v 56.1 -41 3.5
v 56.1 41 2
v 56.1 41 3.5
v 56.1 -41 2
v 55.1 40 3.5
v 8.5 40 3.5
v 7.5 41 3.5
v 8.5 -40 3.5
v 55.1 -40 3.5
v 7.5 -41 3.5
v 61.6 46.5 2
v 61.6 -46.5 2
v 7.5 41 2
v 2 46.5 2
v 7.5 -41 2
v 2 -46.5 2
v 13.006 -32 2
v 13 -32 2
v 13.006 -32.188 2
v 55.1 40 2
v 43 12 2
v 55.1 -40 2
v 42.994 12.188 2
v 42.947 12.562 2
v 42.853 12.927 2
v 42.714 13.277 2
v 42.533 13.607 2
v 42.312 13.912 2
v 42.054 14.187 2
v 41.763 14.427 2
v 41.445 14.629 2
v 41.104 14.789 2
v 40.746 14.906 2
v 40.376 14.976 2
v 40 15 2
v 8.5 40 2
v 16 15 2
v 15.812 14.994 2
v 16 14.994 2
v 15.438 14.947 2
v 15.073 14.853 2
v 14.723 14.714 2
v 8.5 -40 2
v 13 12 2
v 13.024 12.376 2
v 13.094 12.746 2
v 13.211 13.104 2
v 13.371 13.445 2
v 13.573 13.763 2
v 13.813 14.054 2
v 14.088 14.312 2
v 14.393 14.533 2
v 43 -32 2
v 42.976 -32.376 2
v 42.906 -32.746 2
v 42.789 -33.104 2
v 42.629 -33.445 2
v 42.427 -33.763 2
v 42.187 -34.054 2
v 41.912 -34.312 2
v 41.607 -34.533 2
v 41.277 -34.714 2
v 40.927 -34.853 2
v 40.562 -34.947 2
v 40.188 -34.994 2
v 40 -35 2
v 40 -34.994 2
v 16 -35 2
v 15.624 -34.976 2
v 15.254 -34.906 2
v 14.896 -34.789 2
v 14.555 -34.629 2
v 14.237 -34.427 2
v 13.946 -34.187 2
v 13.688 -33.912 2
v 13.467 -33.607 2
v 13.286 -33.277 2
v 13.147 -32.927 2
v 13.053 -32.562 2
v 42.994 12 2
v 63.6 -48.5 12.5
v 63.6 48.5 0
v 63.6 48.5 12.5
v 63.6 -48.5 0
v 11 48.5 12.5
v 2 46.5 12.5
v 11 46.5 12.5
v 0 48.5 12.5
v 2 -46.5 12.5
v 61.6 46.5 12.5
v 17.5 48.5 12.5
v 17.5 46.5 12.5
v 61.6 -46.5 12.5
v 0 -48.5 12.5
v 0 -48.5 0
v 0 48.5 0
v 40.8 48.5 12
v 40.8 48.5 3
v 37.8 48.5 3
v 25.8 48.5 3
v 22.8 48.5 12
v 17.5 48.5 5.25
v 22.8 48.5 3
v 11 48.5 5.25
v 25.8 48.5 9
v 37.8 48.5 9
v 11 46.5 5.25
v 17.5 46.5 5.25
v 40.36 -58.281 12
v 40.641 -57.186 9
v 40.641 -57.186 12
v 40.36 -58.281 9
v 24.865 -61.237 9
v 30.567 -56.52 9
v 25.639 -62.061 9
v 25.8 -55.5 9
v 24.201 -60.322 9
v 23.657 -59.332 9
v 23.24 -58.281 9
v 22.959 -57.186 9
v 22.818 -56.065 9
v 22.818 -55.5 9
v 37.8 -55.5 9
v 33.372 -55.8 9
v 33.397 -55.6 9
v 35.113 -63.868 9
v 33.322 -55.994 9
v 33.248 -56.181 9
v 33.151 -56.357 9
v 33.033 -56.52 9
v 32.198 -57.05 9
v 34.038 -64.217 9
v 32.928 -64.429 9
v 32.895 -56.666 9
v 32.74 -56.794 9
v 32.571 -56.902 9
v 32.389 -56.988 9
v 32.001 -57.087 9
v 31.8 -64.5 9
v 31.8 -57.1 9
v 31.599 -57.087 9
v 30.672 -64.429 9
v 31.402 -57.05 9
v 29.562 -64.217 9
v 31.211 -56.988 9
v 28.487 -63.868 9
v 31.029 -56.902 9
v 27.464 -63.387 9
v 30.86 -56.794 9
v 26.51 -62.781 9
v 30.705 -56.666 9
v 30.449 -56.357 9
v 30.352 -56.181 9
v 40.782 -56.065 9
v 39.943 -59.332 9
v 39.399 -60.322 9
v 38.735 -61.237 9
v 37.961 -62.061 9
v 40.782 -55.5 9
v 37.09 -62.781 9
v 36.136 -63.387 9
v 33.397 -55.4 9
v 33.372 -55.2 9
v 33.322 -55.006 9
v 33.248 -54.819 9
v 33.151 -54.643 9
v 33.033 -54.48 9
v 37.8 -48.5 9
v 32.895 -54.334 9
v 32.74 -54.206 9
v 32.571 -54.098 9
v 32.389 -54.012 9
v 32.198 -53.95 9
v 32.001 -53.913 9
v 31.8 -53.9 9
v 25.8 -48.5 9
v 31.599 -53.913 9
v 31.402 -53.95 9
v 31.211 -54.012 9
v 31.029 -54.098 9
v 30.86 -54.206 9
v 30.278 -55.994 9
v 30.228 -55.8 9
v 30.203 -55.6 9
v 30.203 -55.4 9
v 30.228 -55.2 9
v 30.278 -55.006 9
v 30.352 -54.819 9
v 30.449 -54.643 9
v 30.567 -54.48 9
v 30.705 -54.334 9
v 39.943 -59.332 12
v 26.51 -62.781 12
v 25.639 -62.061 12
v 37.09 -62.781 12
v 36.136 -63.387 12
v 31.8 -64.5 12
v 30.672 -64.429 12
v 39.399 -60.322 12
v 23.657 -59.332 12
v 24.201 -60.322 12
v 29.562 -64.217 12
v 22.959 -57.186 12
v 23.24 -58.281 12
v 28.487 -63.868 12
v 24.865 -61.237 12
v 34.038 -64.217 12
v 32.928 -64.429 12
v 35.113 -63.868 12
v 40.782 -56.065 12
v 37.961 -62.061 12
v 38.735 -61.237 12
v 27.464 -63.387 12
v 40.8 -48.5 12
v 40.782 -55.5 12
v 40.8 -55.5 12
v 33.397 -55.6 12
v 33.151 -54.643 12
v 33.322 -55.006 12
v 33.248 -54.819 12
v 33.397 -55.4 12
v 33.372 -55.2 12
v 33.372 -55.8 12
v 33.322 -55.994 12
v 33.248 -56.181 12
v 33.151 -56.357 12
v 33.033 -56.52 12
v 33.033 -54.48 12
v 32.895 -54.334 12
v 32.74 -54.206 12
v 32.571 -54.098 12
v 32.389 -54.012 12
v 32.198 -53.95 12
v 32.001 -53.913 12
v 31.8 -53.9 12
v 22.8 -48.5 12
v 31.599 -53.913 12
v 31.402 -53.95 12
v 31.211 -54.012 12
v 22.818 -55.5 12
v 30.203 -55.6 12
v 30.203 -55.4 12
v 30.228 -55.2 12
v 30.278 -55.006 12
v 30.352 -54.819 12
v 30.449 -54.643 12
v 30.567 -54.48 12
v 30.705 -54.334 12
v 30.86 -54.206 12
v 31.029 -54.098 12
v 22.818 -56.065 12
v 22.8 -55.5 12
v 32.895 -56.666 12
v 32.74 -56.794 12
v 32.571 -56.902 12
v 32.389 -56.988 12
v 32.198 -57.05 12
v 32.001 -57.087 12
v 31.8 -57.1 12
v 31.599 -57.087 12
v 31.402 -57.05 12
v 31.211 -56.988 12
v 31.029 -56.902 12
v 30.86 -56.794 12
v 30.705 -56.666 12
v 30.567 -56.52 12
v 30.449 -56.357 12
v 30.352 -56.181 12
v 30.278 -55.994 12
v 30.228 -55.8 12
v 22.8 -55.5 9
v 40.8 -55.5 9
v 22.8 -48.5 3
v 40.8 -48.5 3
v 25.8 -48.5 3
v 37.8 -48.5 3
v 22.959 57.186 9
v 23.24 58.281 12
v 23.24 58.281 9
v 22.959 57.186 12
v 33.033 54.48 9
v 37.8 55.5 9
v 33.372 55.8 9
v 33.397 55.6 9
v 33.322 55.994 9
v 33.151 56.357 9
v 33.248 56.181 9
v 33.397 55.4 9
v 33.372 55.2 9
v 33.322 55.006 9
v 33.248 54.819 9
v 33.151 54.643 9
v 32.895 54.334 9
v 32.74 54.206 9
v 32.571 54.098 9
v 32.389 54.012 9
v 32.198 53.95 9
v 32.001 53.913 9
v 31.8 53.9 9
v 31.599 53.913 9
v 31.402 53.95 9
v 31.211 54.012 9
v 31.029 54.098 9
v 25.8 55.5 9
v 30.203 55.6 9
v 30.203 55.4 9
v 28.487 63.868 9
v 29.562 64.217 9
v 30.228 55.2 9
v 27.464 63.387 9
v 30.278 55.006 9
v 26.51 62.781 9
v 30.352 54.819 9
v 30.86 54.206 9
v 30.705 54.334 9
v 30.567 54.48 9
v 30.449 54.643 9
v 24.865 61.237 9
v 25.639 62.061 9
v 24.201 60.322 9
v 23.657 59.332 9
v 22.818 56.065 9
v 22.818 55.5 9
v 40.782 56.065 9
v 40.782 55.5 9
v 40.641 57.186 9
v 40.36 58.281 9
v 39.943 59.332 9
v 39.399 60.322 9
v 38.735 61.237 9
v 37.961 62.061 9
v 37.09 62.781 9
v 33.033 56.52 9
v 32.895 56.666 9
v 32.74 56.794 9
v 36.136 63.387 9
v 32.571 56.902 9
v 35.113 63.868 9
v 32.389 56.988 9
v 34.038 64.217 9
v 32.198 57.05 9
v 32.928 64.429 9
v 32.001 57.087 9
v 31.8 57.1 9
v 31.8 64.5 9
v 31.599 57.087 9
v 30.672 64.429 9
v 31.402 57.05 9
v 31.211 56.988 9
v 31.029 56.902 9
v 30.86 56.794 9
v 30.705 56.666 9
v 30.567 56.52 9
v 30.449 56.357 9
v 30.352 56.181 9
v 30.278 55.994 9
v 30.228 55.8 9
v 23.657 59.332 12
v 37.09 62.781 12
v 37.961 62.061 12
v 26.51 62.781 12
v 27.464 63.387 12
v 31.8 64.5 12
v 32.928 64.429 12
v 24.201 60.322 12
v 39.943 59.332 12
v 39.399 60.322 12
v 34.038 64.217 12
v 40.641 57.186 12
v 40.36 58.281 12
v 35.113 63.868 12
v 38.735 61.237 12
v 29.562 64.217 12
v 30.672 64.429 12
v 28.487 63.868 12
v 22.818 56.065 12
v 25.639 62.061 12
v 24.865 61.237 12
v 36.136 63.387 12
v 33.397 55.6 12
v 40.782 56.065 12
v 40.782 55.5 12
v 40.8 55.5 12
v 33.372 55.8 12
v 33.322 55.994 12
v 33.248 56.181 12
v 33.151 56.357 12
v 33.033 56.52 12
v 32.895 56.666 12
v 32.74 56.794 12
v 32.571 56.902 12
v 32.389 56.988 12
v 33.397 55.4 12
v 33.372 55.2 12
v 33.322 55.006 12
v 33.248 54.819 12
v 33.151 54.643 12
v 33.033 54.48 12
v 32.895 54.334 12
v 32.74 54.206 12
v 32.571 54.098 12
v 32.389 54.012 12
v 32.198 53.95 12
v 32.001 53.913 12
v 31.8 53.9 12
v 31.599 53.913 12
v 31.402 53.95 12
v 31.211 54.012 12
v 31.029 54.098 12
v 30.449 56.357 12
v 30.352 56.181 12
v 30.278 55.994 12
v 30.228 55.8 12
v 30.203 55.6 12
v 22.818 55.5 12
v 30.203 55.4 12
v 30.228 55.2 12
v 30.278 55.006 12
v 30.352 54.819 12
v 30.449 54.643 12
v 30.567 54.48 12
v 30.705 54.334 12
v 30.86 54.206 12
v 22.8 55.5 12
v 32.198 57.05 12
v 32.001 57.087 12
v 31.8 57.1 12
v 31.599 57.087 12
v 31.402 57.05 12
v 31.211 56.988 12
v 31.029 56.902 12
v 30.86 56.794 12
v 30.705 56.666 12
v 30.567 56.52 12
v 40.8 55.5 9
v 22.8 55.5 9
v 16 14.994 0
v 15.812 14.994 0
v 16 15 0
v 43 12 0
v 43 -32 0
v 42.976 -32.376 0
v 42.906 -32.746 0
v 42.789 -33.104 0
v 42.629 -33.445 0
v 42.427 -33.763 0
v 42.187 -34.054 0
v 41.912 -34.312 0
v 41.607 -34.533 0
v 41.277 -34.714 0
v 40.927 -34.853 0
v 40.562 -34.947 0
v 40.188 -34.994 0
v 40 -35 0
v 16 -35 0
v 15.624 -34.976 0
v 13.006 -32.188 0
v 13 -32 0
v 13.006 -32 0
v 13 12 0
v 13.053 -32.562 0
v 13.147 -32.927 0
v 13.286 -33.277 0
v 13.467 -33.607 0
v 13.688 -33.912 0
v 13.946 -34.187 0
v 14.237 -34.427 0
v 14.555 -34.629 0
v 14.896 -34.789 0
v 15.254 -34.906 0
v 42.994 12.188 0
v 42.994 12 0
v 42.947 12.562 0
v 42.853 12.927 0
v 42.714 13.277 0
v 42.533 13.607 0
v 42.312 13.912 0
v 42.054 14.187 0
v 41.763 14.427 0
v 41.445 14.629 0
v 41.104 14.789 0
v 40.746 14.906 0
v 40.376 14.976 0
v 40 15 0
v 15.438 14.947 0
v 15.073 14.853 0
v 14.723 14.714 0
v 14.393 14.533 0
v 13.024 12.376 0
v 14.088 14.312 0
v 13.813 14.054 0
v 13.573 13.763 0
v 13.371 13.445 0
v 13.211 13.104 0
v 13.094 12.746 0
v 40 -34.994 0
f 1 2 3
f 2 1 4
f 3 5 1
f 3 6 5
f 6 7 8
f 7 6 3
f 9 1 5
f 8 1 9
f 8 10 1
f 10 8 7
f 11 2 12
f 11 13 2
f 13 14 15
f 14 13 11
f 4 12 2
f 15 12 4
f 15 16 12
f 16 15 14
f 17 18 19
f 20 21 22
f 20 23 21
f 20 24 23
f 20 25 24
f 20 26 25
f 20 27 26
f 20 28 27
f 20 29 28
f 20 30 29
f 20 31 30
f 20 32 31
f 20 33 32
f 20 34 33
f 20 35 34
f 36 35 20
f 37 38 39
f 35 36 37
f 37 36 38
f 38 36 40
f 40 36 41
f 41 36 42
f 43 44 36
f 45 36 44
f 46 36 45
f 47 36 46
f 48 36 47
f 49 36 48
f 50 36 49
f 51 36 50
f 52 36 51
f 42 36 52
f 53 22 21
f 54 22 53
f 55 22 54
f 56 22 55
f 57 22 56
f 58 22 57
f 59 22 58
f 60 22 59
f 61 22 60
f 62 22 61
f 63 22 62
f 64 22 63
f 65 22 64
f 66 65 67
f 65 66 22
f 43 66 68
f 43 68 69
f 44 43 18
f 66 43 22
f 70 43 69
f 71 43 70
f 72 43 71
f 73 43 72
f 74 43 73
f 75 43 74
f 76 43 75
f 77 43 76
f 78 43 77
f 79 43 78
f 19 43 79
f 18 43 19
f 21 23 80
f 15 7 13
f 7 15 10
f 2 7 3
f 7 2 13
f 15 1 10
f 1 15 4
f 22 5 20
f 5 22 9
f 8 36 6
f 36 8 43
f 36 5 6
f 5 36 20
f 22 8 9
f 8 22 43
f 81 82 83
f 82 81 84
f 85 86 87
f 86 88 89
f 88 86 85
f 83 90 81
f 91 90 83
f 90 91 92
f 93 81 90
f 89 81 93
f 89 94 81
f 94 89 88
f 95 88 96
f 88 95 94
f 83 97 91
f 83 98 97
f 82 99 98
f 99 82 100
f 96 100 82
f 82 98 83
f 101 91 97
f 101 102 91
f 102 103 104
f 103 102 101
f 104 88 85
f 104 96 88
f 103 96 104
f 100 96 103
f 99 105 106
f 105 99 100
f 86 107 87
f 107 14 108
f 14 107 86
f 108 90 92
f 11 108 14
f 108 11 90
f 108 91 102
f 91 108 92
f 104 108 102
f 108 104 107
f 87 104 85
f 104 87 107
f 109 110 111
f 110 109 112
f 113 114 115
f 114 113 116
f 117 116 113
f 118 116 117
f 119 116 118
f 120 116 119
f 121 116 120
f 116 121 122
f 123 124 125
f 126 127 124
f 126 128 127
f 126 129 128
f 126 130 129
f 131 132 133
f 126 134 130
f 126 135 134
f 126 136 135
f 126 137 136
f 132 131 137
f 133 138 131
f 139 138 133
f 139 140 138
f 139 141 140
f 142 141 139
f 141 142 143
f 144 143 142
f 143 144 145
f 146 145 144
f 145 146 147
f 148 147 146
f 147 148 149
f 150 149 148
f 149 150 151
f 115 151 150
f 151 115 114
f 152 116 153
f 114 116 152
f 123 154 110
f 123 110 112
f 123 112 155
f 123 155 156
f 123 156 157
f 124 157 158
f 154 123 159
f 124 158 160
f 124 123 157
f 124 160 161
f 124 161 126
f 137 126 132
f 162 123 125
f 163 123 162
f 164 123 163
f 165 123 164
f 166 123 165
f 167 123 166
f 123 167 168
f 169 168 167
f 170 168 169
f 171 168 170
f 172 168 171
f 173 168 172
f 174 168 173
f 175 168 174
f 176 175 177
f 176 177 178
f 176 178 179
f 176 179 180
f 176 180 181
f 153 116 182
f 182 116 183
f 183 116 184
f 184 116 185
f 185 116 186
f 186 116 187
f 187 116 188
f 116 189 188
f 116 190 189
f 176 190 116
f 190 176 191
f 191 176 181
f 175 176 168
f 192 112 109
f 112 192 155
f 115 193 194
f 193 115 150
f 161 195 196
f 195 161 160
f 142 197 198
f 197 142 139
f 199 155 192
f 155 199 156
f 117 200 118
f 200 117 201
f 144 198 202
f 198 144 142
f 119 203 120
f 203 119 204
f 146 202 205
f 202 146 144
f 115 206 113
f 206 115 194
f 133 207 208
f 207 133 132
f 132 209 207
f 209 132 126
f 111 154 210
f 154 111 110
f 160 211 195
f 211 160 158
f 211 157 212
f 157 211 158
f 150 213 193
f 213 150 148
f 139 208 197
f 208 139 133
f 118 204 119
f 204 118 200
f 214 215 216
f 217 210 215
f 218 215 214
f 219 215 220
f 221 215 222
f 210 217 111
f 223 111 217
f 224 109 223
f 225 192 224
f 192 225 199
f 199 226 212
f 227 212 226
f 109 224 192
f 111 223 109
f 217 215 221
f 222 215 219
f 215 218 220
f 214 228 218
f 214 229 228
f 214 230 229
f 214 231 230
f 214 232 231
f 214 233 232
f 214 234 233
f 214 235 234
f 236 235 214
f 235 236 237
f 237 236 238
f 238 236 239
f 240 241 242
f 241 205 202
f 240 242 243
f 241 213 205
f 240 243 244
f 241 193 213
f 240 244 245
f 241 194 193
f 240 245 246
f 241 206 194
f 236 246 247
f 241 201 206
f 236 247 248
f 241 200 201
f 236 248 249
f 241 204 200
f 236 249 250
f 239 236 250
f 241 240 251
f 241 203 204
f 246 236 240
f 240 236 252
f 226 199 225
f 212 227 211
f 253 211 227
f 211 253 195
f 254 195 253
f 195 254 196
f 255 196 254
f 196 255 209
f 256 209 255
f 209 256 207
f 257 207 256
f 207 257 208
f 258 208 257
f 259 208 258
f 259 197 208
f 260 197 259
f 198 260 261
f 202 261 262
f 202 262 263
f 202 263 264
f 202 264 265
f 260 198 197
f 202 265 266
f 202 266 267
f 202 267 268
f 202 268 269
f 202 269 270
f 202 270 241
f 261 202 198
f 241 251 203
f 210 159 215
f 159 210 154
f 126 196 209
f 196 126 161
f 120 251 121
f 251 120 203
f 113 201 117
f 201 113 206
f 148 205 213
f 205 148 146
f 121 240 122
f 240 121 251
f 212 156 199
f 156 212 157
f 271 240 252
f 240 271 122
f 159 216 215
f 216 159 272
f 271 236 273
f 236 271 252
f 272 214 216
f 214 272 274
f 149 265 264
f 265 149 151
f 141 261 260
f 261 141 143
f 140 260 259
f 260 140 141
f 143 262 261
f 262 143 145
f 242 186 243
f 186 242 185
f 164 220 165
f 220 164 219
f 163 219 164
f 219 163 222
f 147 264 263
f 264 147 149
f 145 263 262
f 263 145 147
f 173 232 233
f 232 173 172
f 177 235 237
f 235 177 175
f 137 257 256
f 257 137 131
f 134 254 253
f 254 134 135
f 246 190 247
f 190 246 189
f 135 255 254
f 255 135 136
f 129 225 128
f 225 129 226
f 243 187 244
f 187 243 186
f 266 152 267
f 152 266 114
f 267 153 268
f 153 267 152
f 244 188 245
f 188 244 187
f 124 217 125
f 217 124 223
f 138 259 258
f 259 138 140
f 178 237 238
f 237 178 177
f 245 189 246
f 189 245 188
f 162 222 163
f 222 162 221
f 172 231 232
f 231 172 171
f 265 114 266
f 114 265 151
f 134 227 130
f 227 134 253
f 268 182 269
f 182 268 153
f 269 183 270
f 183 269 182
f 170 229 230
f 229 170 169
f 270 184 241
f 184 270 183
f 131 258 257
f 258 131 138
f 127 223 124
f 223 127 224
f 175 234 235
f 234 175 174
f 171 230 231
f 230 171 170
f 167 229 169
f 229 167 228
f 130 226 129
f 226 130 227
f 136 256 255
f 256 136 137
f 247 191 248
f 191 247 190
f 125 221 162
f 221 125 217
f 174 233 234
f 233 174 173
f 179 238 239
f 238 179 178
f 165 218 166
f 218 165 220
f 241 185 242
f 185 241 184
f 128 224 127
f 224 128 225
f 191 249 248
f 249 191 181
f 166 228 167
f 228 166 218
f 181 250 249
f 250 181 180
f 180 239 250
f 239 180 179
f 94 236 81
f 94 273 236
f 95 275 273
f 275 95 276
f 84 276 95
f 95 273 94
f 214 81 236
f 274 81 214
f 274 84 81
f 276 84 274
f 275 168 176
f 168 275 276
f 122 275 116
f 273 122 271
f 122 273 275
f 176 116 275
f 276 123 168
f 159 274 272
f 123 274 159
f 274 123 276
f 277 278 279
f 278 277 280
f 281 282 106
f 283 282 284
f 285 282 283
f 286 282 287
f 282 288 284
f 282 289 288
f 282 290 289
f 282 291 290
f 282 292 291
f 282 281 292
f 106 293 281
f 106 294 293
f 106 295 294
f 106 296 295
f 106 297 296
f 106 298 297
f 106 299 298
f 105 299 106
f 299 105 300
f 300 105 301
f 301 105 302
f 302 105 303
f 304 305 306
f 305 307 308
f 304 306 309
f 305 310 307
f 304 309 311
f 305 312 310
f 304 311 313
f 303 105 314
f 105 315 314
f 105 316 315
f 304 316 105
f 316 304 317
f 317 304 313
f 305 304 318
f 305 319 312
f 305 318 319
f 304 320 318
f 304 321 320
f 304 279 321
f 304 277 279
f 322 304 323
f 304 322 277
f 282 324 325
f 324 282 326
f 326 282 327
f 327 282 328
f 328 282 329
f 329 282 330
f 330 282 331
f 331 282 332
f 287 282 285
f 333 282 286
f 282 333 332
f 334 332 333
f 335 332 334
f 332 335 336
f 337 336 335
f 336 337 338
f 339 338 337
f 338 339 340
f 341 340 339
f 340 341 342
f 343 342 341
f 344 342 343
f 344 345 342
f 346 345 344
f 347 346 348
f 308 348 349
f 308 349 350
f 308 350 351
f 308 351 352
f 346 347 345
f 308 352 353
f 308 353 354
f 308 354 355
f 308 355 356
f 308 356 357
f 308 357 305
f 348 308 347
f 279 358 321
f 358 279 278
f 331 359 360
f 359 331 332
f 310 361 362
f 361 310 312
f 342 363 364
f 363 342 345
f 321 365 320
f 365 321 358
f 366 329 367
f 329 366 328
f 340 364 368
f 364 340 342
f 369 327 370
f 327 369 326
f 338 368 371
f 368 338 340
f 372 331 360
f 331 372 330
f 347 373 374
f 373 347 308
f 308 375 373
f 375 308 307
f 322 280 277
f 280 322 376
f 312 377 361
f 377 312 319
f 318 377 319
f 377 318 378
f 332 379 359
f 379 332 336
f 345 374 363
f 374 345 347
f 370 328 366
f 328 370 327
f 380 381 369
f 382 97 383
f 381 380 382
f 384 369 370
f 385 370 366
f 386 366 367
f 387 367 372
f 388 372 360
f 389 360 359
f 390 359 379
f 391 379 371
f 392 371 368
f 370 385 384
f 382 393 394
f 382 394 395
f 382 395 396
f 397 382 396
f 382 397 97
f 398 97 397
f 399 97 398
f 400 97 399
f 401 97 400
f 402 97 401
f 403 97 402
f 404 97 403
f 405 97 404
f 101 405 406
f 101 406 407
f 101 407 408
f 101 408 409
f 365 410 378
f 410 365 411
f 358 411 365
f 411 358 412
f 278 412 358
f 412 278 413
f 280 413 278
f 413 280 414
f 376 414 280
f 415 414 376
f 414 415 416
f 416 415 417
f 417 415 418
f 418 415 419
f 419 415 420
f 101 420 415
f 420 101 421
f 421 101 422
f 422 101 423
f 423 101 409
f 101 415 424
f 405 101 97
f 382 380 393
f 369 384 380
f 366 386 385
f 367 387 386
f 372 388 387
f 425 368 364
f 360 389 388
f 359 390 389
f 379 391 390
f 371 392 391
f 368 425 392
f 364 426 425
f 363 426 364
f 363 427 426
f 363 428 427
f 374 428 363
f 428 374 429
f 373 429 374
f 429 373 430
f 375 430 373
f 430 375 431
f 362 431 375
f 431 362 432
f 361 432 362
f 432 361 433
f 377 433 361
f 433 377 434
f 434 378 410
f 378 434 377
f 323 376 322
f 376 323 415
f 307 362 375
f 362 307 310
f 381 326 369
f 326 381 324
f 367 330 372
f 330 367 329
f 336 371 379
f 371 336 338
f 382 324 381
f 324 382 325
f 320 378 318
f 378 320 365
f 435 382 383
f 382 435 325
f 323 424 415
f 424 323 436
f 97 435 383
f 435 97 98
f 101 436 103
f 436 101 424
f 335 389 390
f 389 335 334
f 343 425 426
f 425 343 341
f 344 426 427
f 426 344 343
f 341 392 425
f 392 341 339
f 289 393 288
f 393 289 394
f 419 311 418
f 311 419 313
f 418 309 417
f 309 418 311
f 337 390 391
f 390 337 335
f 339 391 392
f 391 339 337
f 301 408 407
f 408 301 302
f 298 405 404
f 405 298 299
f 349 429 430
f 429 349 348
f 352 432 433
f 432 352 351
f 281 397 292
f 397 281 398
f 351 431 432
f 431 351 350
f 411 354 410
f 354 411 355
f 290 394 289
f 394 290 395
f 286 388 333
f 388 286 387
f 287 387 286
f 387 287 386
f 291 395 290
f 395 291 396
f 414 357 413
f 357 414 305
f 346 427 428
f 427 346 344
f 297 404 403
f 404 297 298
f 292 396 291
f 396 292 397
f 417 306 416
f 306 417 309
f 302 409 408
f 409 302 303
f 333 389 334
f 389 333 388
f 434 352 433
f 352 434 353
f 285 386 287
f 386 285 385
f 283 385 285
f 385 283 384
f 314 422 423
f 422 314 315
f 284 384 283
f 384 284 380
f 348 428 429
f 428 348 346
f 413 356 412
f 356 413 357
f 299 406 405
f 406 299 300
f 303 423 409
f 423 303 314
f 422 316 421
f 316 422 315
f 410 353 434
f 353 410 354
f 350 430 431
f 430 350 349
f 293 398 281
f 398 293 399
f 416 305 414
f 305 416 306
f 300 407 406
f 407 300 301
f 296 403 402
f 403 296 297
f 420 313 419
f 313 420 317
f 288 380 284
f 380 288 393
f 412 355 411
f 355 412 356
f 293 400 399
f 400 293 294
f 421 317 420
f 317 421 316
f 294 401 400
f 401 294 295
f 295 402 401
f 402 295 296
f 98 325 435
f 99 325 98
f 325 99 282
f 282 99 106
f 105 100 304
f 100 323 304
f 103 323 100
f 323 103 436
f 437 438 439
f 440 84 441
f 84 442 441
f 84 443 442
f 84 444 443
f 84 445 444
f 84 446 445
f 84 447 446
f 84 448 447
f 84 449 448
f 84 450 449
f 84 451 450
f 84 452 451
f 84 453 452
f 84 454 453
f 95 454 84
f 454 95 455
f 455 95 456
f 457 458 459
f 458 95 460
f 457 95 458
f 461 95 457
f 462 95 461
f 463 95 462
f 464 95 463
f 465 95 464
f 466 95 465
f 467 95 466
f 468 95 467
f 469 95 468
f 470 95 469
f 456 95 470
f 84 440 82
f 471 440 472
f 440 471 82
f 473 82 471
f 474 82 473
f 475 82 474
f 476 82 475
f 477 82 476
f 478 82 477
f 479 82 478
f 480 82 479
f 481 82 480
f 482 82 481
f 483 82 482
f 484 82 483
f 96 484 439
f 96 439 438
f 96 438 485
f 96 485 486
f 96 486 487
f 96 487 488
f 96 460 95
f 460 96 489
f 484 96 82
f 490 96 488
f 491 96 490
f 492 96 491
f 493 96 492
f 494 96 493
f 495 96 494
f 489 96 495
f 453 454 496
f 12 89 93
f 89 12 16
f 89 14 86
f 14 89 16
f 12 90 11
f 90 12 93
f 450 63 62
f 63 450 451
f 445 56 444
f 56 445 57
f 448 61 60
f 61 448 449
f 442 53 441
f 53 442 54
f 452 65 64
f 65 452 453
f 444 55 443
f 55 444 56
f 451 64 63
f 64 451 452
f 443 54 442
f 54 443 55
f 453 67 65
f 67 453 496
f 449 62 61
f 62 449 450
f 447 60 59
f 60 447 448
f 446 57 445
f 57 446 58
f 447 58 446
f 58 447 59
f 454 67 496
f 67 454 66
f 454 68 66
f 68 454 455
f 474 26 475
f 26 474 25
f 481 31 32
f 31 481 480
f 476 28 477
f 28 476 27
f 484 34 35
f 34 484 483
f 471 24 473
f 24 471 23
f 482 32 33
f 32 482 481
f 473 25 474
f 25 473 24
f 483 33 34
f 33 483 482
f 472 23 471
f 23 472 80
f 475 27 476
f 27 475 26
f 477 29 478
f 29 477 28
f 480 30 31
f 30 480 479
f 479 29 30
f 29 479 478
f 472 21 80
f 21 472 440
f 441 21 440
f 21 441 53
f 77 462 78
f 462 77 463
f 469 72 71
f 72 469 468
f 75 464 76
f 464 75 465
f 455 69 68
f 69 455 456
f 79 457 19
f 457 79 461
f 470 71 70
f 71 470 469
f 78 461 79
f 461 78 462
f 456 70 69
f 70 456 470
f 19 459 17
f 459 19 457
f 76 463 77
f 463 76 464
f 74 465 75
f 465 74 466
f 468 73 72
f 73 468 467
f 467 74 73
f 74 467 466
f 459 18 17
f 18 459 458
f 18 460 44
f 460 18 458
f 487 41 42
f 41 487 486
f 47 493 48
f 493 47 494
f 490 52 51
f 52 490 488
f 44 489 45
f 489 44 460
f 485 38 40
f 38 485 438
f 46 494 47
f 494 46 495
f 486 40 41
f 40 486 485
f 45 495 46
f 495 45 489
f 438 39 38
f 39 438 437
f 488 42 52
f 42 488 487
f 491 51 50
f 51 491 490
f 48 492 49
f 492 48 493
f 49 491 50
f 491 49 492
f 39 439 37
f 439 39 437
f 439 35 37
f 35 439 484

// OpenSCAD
/* File: codewheel_cover.scad
 * Cover for PC board box in codewheel_fixture
 * Author: deh
 * Latest edit: 201702031630
 */

 $fn=50;

// PC board dimensions
pc_slop = 4;
pcwid = 49.6 + pc_slop;	// Width of PC board
pclen = 83.0 + pc_slop;	// Length of PC board
pcthick = 1.7;	// Thickness of board

module wedge(l, w, h)
 {
   polyhedron(
      points=[[0,0,0], [l,0,0], [l,w,0], [0,w,0], [0,w,h], [l,w,h]],
       faces=[[0,1,2,3],[5,4,3,2],[0,4,5,1],[0,3,4],[5,2,1]] );
 }

module tube(d1,d2,ht)
{
   difference()
   {
     cylinder(d = d1, h = ht, center = false);
     cylinder(d = d2, h = ht + .001, center = false);
   }
}
module mag_mnt_bar(d1, d2, len, ht)
{
   difference()
   {
     union()
     {
        cylinder(d = d1, h = ht, center = false);
        translate([-len, -d1/2, 0])
           cube([len, d1, ht]);
     }
       cylinder(d = d2, h = ht + .001, center = false);
   }
    
}
// Tabs for holding pc board cover down
bt_wid = 18;
bt_hole_dia = 3.2;  // Screw hold dia
bt_thick = 3;	// Thickness
bt_len = 10;	// Length
bt_w_ht = 6;	// Stiffner height

module brd_tab()
{
   mag_mnt_bar(bt_wid, bt_hole_dia, bt_len - shell_wall, bt_thick);
   translate([0 ,(bt_wid/2 - bt_thick),bt_thick])
      rotate([0,0,90])
         wedge(bt_thick,bt_len-3,bt_w_ht);
   translate([0 ,-(bt_wid/2),bt_thick])
      rotate([0,0,90])
         wedge(bt_thick,bt_len-3,bt_w_ht);
}
base_thick 	= 2.0;	// Thickness of base
base_rad	= 10;	// Radius around mags

shell_wall = 2;		// Cover wall thickness
shell_ht = 10.5;	;	// Cover side height
shell_gap = 1;		// Cover gap between enclosure walls and cover

shell_x = pcwid + 4*shell_wall + 2*shell_gap;
shell_y = pclen + 4*shell_wall + 2*shell_gap;

tab_ofs = shell_wall + shell_gap;

shell_iofs = 5;
shell_ix = pcwid-shell_iofs;  // Inner ridge location
shell_iy = pclen-shell_iofs;
shell_ih = 1.5;	// Height of inner ridge
shell_iw = 1; 	// Width of inner ridge
shell_iix = shell_ix - 2*shell_iw;
shell_iiy = shell_iy - 2*shell_iw;
shell_or_x1 = shell_gap + 2*shell_wall + shell_iofs/2;
shell_or_x2 = shell_or_x1 + shell_iw;

// CAN bus cable cutout in wall
cc_wid = 6.5;		// Telephone type cable width
cc_thick = 2.25;	// Thickness
cc_frm_top = 3;		// Offset from top of side
cc_frm_side = 11;	// Offset from side
cc_sense_dia = 4;	// Sensor cable dia
cc_z = cc_thick + cc_frm_top;

module pc_shell()
{

   // Cover top
   translate([0,-shell_y/2,0])
   cube([shell_x,shell_y,base_thick],false);

   // Ridge for O-ring type sealing
   difference()
   {
      translate([shell_or_x1,-shell_iy/2,base_thick])
         cube([shell_ix,shell_iy,shell_ih],false);
      translate([shell_or_x2,-shell_iiy/2,base_thick])
         cube([shell_iix,shell_iiy,shell_ih],false);

   }

   // Wall: +y end with cable cutout
 difference()
 {
   translate([0, shell_y/2 - shell_wall,base_thick])
     cube([shell_x, shell_wall, shell_ht]);
   translate([cc_frm_side, shell_y/2 - shell_wall - .01, shell_ht - cc_z])
     cube([cc_wid,shell_wall + .01, 10],false);
 }
   // Wall: -y end 
   translate([0, -shell_y/2,base_thick])
     cube([shell_x, shell_wall, shell_ht]);
//    rotate([0,0,-90])
//     rounded_rect_ridge(shell_wall, shell_x, shell_ht);

   // Wall: x=0 side
   translate([0, -shell_y/2, base_thick])
   {
     cube([shell_wall, shell_y, shell_ht]);
//       round_ridge(shell_wall,shell_y, shell_ht);
   }

   // Wall: +x side
   translate([shell_x - shell_wall, -shell_y/2, base_thick])
     cube([shell_wall, shell_y, shell_ht]);

 
   // Tabs for mounting top cover
   translate([shell_x/2,-(shell_y/2 + bt_len - tab_ofs),shell_ht+1.5])
     rotate([0,180,90])
        brd_tab();
   translate([shell_x/2,(shell_y/2 + bt_len - tab_ofs),shell_ht+1.5])
     rotate([0,180,-90])
        brd_tab();

}
module rounded_bar_end(l, w, h)
{
        cylinder(d = w, h = h, center = false);
        translate([-l, -w/2, 0])
           cube([l, w, h],false);
}
module rounded_rectangle(lo,wo,h,rad)
{
 translate([-rad/2,rad/2,0])
 {
  l = lo - rad; w = wo - rad;
  lr = l - 2*rad; wr = w - 2*rad;
   translate([-l,0,0])
     cube([l,w,h],false);

   ww = w; ll = l;
   translate([0,0,0])
     rounded_bar_end(ll,rad,h);
   translate([0,ww,0])
     rotate([0,0,90])
        rounded_bar_end(ww,rad,h);
   translate([-ll,0,0])
     rotate([0,0,-90])
        rounded_bar_end(ww,rad,h);
   translate([-ll,ww,0])
     rotate([0,0,180])
        rounded_bar_end(ll,rad,h);
 }
}
// Window 
module window()
{
  translate([43,-35,0])
     rounded_rectangle(30,50, base_thick+3,6);    

//  translate([15,-35,0])
//         cube([30,50,base_thick+3],false);    

//translate([-50,0,0])
//     rounded_rectangle(30,15, base_thick+3, 3);    
}


module total()
{
   difference()
   {
      pc_shell();
        window();
   }
//      window();
}
total();
